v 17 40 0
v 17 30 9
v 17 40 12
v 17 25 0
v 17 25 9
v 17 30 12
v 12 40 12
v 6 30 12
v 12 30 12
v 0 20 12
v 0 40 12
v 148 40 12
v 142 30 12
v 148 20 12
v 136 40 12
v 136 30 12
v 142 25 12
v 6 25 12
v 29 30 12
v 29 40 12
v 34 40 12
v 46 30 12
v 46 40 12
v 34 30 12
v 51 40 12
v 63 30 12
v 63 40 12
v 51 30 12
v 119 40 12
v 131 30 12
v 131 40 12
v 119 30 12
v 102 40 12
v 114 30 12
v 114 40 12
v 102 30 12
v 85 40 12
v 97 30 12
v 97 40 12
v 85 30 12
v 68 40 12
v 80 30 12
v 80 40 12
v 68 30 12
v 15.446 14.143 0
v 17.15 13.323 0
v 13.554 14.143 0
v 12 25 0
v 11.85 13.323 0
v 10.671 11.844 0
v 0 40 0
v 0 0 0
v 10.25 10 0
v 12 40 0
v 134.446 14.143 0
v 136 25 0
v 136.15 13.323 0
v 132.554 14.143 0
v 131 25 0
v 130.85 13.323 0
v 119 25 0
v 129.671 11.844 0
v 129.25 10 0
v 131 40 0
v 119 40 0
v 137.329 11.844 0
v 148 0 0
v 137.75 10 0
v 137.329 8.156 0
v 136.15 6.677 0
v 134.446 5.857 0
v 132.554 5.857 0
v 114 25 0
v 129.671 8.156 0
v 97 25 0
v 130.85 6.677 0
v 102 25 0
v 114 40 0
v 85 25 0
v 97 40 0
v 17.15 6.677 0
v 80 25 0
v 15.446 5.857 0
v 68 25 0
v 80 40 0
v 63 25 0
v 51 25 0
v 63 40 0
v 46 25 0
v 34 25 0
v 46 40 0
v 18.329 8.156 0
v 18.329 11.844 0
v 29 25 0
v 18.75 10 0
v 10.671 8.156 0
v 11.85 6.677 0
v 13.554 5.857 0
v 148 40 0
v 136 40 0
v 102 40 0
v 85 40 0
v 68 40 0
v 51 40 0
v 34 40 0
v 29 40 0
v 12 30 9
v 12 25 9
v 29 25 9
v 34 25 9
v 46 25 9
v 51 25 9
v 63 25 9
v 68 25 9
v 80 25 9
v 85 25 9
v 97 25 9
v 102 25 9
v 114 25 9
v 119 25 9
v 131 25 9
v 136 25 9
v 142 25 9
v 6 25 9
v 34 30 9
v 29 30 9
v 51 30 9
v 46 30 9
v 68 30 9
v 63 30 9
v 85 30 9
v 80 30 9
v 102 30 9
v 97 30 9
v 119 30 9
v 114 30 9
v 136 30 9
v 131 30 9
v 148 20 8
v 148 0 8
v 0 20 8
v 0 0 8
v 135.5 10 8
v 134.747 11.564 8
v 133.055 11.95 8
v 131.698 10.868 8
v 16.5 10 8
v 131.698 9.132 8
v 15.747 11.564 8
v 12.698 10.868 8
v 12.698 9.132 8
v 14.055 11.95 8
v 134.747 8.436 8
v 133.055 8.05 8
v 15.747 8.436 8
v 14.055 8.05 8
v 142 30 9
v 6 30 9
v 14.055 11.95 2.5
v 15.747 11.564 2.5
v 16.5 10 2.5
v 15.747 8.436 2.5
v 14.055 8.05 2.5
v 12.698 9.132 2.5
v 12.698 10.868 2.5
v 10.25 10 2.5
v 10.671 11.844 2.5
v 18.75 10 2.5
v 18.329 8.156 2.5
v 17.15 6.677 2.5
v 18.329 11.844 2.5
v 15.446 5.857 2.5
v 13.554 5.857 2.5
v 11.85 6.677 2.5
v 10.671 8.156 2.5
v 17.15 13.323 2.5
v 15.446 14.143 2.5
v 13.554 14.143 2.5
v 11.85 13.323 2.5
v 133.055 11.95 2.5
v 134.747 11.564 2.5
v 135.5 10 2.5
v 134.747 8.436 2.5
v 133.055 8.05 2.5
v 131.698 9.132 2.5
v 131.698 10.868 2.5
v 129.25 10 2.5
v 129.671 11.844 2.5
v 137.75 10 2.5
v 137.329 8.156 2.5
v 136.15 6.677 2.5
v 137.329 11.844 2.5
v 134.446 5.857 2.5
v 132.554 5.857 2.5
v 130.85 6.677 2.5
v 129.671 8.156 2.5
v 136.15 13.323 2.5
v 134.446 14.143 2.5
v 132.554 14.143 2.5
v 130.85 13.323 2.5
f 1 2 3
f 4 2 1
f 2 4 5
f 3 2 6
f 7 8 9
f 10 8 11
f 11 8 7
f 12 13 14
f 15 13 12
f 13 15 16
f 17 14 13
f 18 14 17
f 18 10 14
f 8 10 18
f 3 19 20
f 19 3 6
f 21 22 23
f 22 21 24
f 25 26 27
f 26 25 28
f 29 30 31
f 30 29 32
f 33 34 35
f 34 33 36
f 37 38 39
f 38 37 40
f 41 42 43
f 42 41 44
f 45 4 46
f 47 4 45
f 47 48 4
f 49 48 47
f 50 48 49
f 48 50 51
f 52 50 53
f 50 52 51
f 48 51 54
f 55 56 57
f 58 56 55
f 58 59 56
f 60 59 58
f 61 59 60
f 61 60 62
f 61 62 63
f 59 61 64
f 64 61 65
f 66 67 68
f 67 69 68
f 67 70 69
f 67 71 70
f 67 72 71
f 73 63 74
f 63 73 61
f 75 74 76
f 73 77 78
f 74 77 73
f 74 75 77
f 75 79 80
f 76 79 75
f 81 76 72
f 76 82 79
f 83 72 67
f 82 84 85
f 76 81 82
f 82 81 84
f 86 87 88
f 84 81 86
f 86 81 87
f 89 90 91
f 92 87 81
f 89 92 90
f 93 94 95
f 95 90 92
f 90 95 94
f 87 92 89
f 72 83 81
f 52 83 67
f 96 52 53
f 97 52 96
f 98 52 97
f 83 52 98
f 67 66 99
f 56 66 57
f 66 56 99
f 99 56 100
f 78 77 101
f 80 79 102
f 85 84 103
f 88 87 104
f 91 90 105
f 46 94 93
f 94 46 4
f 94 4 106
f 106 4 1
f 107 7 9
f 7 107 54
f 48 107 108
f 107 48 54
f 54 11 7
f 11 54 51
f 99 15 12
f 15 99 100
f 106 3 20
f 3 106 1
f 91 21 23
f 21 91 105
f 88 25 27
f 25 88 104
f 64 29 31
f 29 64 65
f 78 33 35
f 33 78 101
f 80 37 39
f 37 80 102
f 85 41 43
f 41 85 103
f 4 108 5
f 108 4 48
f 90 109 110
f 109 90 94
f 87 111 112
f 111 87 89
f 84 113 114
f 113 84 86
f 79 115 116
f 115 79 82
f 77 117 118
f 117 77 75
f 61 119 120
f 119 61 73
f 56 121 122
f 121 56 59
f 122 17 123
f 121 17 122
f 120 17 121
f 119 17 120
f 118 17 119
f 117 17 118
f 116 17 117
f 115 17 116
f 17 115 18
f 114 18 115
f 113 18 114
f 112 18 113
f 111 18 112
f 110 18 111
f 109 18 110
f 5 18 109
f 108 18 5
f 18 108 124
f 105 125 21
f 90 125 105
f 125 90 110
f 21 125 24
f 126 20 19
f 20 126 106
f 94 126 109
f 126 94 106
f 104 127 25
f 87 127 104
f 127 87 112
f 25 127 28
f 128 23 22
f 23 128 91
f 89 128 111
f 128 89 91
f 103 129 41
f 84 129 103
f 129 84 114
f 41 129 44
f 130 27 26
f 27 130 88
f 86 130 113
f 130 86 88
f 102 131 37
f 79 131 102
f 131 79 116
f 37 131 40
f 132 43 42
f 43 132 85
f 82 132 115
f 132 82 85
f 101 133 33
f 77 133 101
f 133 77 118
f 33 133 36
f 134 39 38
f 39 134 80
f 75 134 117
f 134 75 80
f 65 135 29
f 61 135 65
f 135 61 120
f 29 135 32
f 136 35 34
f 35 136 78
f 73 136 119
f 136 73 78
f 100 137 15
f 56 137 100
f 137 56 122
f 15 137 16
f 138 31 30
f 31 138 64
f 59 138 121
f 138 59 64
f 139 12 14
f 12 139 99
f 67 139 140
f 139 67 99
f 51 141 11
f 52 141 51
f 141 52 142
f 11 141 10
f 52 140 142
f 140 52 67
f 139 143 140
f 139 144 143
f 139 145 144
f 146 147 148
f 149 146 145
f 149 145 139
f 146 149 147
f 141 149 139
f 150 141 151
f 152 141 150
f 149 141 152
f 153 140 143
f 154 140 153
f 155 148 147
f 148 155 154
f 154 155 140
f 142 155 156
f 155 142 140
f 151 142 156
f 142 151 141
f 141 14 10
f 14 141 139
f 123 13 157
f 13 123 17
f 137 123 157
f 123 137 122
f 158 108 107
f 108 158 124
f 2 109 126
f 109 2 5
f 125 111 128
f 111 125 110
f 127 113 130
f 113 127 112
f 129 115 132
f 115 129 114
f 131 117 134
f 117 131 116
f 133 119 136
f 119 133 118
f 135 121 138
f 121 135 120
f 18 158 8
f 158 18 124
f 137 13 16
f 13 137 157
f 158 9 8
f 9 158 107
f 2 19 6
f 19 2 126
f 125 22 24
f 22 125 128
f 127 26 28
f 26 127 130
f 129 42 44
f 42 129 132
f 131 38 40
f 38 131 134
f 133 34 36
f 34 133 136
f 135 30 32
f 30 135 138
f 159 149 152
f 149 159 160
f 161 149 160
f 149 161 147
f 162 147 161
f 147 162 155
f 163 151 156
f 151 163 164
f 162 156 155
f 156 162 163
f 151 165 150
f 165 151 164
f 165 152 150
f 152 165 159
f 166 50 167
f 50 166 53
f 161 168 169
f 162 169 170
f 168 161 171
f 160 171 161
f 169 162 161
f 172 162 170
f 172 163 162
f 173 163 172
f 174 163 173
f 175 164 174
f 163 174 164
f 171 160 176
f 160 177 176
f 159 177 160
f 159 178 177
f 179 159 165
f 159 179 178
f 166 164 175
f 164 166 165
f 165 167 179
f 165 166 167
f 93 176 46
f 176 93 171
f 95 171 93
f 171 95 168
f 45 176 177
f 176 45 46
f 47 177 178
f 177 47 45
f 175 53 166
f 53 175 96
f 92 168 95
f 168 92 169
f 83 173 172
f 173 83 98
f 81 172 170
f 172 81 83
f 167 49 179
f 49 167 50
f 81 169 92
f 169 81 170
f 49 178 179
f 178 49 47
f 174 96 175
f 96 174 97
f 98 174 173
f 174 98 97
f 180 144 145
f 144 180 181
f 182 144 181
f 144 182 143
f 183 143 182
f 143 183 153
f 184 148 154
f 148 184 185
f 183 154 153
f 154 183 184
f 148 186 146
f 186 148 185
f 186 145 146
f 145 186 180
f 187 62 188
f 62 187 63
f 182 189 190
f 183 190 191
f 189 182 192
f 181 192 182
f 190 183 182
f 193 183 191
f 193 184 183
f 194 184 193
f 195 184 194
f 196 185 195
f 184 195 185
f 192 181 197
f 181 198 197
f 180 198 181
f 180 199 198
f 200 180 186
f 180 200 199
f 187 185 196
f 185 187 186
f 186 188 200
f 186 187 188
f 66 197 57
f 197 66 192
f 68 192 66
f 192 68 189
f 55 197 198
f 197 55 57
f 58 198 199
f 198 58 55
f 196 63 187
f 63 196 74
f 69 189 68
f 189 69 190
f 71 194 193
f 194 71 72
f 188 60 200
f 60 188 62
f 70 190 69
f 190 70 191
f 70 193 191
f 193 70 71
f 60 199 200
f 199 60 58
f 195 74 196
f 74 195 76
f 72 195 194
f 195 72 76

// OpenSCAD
// https://en.wikibooks.org/wiki/OpenSCAD_User_Manual/Text
// (c) 2024 Ali Craigmile <ali@craigmile.com>


ducts = 8;
ductwidth=5;
between=12;

ductdepth=15;
depth=12;
cutawaydepth=4;
length=((ductwidth+between)*ducts)+between;
tracklength=((ductwidth+between)*ducts);
screw=4;
screwhead=8.5;
screwheaddepth=2.5;

cutawaywidth=20;
width=40;

box=[length,width,depth];
cutawaybox=[length,cutawaywidth,cutawaydepth];
cableduct=[ductwidth,ductdepth,depth];
track=[tracklength,5,5];

difference() {

    cube(box,false);

    //cutaway area for desk mounting
    translate([0,0,depth-cutawaydepth]) {
        cube(cutawaybox,false);
    }

    //cable ducts
    for(i=[0:ducts-1]) {
        x = ((ductwidth+between) * i) + between;
        y = width-ductdepth;
        translate([x,y,0]) {
            cube(cableduct,false);
        }
    }

    //retaining track 
    translate([between/2,width-15,depth-3]) {
        cube(track,false);
    }

    //mounting holes
    translate([between+(ductwidth/2),cutawaywidth/2,0]) {
        cylinder(depth,screw/2,screw/2);
    }

    translate([between+(ductwidth/2),cutawaywidth/2,0]) {
        cylinder(screwheaddepth,screwhead/2,screwhead/2);
    }


    //countersink mounting holes
    translate([length-between-(ductwidth/2),cutawaywidth/2,0]) {
        cylinder(depth,screw/2,screw/2);
    }

    translate([length-between-(ductwidth/2),cutawaywidth/2,0]) {
        cylinder(screwheaddepth,screwhead/2,screwhead/2);
    }



}
